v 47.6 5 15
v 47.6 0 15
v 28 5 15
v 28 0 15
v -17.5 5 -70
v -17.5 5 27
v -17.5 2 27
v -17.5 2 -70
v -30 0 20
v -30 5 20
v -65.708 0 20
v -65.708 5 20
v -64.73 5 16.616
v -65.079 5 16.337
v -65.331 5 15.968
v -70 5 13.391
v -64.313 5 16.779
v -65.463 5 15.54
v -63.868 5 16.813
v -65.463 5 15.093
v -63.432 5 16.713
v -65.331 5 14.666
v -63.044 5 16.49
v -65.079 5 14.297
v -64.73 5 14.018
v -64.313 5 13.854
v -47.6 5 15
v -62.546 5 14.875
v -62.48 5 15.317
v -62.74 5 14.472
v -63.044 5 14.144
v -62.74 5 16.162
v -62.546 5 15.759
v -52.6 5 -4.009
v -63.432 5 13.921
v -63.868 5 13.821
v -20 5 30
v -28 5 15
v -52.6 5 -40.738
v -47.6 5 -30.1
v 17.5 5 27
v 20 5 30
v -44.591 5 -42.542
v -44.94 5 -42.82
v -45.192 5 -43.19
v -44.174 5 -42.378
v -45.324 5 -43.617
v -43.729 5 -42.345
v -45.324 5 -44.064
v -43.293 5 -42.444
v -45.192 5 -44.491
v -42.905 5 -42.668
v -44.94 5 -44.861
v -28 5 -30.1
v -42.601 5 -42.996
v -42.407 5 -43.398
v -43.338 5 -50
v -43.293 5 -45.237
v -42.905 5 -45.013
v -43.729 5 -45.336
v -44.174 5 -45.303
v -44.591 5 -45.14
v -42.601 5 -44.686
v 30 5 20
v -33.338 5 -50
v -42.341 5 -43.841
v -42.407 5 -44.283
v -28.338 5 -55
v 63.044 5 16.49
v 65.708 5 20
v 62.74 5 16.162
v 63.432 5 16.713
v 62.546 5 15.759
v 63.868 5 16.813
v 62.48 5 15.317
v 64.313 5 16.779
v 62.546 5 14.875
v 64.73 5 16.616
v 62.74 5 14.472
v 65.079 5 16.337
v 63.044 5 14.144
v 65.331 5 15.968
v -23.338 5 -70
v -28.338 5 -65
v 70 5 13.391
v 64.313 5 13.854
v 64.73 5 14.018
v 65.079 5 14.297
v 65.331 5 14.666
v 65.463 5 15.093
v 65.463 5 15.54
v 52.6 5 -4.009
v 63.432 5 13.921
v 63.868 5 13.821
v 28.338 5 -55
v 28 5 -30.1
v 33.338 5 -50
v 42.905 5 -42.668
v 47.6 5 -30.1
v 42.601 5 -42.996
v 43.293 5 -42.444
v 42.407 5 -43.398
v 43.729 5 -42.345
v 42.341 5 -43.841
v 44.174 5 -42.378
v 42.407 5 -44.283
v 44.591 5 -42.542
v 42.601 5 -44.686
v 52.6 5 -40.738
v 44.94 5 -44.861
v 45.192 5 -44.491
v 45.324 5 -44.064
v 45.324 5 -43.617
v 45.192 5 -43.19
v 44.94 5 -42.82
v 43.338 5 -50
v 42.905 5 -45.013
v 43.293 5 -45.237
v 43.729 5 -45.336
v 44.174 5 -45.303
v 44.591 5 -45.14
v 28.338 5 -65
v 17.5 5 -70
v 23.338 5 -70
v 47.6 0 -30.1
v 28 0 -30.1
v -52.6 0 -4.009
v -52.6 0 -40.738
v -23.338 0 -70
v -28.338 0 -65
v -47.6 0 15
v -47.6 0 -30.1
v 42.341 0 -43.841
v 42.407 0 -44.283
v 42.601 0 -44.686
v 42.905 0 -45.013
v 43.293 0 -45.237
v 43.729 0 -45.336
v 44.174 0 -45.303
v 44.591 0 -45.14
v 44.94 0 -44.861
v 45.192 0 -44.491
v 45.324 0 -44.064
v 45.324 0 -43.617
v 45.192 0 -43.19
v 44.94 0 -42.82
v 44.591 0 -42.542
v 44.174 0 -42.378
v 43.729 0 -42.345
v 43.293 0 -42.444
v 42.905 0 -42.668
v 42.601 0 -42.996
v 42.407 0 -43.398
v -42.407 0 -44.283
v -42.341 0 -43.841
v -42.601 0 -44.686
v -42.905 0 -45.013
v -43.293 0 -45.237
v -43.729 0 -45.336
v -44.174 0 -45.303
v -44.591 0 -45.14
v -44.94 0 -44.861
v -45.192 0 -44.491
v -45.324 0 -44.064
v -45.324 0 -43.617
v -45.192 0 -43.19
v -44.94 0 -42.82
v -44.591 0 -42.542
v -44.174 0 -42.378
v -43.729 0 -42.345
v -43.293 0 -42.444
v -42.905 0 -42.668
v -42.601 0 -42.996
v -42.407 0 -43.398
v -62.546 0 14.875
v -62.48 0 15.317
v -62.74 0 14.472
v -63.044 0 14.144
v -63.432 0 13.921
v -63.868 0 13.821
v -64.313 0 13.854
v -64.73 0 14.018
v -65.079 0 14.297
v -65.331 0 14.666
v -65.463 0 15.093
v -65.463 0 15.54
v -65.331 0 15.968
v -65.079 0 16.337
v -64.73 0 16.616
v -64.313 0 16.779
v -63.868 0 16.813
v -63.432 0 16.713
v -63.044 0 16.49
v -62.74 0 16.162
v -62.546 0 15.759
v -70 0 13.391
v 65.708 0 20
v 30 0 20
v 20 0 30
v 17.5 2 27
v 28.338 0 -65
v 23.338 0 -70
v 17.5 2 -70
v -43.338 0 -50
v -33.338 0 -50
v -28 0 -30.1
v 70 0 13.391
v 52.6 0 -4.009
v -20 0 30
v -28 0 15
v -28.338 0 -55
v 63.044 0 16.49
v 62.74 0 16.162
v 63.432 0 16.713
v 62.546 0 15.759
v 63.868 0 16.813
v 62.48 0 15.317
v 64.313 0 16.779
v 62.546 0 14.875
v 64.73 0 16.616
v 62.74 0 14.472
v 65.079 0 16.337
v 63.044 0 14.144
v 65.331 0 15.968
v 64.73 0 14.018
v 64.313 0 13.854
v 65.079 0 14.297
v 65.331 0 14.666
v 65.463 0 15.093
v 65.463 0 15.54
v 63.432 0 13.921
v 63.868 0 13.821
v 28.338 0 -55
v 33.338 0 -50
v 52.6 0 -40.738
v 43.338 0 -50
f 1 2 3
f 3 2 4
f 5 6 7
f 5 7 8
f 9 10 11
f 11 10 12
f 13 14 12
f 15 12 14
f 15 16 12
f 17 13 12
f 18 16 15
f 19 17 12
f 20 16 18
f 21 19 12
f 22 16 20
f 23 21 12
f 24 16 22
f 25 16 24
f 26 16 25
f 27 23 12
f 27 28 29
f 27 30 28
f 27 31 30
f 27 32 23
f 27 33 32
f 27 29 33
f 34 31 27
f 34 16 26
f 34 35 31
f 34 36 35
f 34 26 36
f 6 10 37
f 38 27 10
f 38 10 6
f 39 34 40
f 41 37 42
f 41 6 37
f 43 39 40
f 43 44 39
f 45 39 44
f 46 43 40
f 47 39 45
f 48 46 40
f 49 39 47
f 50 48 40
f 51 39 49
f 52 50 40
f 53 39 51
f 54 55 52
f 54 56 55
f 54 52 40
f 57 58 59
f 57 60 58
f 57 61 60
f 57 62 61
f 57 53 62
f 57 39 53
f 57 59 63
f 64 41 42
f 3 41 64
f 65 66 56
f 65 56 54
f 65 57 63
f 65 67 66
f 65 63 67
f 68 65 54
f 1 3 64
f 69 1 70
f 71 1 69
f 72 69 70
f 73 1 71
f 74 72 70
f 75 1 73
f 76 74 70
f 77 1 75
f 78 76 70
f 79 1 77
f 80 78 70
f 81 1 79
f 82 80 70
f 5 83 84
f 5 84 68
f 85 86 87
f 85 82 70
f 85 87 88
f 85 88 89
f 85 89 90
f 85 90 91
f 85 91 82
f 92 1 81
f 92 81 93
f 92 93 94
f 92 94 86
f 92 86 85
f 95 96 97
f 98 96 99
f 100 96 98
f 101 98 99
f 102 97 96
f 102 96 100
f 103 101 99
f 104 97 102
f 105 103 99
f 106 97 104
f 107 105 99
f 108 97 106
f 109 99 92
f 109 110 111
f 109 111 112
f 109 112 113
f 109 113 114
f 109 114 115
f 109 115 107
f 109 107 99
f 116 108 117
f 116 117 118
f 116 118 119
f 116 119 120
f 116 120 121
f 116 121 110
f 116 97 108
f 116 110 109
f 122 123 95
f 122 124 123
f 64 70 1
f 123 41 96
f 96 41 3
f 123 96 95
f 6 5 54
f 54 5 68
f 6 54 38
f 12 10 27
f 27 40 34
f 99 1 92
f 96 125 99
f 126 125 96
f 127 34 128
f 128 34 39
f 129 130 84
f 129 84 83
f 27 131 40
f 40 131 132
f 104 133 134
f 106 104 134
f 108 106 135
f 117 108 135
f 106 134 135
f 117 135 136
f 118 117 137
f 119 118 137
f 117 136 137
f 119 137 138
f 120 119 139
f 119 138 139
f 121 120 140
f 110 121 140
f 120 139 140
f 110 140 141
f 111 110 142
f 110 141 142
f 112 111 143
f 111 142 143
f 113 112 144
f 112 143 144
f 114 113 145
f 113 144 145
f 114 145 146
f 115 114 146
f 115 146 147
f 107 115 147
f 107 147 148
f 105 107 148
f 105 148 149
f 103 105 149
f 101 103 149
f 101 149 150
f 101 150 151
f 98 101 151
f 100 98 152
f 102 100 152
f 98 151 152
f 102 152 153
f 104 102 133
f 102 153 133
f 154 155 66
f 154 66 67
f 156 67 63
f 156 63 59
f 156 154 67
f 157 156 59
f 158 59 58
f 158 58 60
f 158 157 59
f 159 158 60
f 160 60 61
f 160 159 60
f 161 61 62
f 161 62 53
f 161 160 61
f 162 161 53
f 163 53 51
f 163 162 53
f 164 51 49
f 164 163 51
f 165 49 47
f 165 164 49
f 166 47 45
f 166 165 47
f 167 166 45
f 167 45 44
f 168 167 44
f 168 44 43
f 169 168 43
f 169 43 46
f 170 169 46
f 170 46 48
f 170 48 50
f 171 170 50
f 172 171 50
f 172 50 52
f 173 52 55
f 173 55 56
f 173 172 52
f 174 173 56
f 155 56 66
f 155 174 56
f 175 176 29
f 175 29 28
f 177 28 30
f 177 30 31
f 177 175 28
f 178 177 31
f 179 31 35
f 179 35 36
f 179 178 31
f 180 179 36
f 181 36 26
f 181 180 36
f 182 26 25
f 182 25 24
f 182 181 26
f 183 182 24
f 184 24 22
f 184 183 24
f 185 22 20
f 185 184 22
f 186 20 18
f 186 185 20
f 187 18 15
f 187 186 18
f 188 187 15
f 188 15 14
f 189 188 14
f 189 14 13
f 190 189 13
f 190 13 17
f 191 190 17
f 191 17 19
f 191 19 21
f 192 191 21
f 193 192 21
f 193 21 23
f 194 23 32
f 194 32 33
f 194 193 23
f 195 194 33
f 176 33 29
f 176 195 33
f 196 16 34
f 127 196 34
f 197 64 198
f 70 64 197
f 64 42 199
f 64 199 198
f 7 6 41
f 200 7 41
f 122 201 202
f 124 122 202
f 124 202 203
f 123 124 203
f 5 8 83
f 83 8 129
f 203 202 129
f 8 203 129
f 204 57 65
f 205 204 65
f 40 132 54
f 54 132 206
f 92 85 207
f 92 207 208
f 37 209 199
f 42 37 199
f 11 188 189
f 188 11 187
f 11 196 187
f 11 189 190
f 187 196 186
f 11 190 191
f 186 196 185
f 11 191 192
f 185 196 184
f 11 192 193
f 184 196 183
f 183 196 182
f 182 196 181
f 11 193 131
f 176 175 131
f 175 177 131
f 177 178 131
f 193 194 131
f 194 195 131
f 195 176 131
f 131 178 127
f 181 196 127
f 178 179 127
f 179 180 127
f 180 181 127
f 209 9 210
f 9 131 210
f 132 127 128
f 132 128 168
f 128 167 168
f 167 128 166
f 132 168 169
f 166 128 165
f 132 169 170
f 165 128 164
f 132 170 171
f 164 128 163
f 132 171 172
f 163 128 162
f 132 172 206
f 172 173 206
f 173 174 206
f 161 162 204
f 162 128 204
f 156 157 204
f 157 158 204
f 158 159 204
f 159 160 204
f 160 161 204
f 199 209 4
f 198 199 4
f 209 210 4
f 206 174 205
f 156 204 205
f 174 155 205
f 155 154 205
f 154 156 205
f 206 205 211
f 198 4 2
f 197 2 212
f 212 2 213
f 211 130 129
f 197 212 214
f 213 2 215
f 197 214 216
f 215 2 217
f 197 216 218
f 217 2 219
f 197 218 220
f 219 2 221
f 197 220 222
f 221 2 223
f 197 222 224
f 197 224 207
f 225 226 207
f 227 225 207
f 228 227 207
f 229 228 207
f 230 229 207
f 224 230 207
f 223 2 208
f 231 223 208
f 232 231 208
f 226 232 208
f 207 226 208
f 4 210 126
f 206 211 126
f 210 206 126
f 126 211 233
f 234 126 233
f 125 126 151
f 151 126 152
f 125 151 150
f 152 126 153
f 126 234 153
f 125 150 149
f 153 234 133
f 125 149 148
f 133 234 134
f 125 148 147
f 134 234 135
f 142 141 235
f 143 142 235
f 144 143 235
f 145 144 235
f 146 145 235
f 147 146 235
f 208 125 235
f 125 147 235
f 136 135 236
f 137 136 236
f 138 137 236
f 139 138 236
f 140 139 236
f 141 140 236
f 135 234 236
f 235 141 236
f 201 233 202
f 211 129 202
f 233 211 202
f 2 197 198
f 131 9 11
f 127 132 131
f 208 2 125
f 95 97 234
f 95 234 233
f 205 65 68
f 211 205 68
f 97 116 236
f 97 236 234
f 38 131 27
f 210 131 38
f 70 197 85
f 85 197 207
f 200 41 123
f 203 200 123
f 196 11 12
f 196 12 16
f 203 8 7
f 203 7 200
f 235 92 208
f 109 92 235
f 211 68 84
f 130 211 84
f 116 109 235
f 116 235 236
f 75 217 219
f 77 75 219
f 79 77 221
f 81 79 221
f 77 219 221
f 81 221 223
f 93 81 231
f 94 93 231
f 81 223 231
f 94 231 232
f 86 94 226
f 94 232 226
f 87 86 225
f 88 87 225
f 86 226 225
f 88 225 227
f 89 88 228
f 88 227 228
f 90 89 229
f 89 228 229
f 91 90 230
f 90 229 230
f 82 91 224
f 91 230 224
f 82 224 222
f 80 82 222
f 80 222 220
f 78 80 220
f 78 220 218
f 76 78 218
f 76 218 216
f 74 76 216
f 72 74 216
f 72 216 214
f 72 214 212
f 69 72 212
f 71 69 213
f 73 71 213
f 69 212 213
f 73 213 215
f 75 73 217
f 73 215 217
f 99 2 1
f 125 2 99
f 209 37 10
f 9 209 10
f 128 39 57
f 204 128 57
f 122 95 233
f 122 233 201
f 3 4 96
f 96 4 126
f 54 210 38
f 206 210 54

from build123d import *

# Parameters (mm, degrees)
SKETCH1_R           = 1.5
SKETCH1_W           = 19.6
SKETCH1_H           = 45.1
BOSS_EXTRUDE1_DEPTH = 5
CUT_EXTRUDE2_DEPTH  = 5
SKETCH2_W           = 35
SKETCH2_H           = 97
CUT_EXTRUDE1_DEPTH  = 3


with BuildPart() as part:
    # Sketch1 → Boss-Extrude1 (new body)
    with BuildSketch(Plane(origin=(0, 0, 0), x_dir=(1, 0, 0), z_dir=(0, 1, 0))):
        Polygon((-59.213749531, -30), (-70, -13.390630812), (-70, 23.338095117), (-23.338095117, 70), (0, 70), (0, -30), align=None)
        with Locations((-43.840620434, 43.840620434)):
            Circle(SKETCH1_R, mode=Mode.SUBTRACT)
        with Locations((-63.979633983, -15.316867676)):
            Circle(SKETCH1_R, mode=Mode.SUBTRACT)
        with Locations((-37.8, 7.55)):
            Rectangle(SKETCH1_W, SKETCH1_H, mode=Mode.SUBTRACT)
    boss_extrude1 = extrude(amount=BOSS_EXTRUDE1_DEPTH)

    # Sketch3 → Cut-Extrude2 (cut)
    with BuildSketch(Plane(origin=(0, 5, 0), x_dir=(1, 0, 0), z_dir=(0, 1, 0))):
        Polygon((-20, -30), (-30, -20), (-65.707825463, -20), (-70, -13.390630812), (-52.6, 4.009369188), (-52.6, 40.738095117), (-43.338095117, 50), (-33.338095117, 50), (-28.338095117, 55), (-28.338095117, 65), (-75, 65), (-75, -30), align=None)
    cut_extrude2 = extrude(amount=-CUT_EXTRUDE2_DEPTH, mode=Mode.SUBTRACT)

    # Mirror1: Boss-Extrude1, Cut-Extrude2 across plane
    add(boss_extrude1.mirror(Plane(origin=(0, 5, 30), x_dir=(0, 0, 1), z_dir=(-1, 0, 0))))
    add(cut_extrude2.mirror(Plane(origin=(0, 5, 30), x_dir=(0, 0, 1), z_dir=(-1, 0, 0))), mode=Mode.SUBTRACT)

    # Sketch2 → Cut-Extrude1 (cut)
    with BuildSketch(Plane(origin=(0, 5, 0), x_dir=(1, 0, 0), z_dir=(0, 1, 0))):
        with Locations((0, 21.5)):
            Rectangle(SKETCH2_W, SKETCH2_H)
    extrude(amount=-CUT_EXTRUDE1_DEPTH, mode=Mode.SUBTRACT)


solid = part.part
